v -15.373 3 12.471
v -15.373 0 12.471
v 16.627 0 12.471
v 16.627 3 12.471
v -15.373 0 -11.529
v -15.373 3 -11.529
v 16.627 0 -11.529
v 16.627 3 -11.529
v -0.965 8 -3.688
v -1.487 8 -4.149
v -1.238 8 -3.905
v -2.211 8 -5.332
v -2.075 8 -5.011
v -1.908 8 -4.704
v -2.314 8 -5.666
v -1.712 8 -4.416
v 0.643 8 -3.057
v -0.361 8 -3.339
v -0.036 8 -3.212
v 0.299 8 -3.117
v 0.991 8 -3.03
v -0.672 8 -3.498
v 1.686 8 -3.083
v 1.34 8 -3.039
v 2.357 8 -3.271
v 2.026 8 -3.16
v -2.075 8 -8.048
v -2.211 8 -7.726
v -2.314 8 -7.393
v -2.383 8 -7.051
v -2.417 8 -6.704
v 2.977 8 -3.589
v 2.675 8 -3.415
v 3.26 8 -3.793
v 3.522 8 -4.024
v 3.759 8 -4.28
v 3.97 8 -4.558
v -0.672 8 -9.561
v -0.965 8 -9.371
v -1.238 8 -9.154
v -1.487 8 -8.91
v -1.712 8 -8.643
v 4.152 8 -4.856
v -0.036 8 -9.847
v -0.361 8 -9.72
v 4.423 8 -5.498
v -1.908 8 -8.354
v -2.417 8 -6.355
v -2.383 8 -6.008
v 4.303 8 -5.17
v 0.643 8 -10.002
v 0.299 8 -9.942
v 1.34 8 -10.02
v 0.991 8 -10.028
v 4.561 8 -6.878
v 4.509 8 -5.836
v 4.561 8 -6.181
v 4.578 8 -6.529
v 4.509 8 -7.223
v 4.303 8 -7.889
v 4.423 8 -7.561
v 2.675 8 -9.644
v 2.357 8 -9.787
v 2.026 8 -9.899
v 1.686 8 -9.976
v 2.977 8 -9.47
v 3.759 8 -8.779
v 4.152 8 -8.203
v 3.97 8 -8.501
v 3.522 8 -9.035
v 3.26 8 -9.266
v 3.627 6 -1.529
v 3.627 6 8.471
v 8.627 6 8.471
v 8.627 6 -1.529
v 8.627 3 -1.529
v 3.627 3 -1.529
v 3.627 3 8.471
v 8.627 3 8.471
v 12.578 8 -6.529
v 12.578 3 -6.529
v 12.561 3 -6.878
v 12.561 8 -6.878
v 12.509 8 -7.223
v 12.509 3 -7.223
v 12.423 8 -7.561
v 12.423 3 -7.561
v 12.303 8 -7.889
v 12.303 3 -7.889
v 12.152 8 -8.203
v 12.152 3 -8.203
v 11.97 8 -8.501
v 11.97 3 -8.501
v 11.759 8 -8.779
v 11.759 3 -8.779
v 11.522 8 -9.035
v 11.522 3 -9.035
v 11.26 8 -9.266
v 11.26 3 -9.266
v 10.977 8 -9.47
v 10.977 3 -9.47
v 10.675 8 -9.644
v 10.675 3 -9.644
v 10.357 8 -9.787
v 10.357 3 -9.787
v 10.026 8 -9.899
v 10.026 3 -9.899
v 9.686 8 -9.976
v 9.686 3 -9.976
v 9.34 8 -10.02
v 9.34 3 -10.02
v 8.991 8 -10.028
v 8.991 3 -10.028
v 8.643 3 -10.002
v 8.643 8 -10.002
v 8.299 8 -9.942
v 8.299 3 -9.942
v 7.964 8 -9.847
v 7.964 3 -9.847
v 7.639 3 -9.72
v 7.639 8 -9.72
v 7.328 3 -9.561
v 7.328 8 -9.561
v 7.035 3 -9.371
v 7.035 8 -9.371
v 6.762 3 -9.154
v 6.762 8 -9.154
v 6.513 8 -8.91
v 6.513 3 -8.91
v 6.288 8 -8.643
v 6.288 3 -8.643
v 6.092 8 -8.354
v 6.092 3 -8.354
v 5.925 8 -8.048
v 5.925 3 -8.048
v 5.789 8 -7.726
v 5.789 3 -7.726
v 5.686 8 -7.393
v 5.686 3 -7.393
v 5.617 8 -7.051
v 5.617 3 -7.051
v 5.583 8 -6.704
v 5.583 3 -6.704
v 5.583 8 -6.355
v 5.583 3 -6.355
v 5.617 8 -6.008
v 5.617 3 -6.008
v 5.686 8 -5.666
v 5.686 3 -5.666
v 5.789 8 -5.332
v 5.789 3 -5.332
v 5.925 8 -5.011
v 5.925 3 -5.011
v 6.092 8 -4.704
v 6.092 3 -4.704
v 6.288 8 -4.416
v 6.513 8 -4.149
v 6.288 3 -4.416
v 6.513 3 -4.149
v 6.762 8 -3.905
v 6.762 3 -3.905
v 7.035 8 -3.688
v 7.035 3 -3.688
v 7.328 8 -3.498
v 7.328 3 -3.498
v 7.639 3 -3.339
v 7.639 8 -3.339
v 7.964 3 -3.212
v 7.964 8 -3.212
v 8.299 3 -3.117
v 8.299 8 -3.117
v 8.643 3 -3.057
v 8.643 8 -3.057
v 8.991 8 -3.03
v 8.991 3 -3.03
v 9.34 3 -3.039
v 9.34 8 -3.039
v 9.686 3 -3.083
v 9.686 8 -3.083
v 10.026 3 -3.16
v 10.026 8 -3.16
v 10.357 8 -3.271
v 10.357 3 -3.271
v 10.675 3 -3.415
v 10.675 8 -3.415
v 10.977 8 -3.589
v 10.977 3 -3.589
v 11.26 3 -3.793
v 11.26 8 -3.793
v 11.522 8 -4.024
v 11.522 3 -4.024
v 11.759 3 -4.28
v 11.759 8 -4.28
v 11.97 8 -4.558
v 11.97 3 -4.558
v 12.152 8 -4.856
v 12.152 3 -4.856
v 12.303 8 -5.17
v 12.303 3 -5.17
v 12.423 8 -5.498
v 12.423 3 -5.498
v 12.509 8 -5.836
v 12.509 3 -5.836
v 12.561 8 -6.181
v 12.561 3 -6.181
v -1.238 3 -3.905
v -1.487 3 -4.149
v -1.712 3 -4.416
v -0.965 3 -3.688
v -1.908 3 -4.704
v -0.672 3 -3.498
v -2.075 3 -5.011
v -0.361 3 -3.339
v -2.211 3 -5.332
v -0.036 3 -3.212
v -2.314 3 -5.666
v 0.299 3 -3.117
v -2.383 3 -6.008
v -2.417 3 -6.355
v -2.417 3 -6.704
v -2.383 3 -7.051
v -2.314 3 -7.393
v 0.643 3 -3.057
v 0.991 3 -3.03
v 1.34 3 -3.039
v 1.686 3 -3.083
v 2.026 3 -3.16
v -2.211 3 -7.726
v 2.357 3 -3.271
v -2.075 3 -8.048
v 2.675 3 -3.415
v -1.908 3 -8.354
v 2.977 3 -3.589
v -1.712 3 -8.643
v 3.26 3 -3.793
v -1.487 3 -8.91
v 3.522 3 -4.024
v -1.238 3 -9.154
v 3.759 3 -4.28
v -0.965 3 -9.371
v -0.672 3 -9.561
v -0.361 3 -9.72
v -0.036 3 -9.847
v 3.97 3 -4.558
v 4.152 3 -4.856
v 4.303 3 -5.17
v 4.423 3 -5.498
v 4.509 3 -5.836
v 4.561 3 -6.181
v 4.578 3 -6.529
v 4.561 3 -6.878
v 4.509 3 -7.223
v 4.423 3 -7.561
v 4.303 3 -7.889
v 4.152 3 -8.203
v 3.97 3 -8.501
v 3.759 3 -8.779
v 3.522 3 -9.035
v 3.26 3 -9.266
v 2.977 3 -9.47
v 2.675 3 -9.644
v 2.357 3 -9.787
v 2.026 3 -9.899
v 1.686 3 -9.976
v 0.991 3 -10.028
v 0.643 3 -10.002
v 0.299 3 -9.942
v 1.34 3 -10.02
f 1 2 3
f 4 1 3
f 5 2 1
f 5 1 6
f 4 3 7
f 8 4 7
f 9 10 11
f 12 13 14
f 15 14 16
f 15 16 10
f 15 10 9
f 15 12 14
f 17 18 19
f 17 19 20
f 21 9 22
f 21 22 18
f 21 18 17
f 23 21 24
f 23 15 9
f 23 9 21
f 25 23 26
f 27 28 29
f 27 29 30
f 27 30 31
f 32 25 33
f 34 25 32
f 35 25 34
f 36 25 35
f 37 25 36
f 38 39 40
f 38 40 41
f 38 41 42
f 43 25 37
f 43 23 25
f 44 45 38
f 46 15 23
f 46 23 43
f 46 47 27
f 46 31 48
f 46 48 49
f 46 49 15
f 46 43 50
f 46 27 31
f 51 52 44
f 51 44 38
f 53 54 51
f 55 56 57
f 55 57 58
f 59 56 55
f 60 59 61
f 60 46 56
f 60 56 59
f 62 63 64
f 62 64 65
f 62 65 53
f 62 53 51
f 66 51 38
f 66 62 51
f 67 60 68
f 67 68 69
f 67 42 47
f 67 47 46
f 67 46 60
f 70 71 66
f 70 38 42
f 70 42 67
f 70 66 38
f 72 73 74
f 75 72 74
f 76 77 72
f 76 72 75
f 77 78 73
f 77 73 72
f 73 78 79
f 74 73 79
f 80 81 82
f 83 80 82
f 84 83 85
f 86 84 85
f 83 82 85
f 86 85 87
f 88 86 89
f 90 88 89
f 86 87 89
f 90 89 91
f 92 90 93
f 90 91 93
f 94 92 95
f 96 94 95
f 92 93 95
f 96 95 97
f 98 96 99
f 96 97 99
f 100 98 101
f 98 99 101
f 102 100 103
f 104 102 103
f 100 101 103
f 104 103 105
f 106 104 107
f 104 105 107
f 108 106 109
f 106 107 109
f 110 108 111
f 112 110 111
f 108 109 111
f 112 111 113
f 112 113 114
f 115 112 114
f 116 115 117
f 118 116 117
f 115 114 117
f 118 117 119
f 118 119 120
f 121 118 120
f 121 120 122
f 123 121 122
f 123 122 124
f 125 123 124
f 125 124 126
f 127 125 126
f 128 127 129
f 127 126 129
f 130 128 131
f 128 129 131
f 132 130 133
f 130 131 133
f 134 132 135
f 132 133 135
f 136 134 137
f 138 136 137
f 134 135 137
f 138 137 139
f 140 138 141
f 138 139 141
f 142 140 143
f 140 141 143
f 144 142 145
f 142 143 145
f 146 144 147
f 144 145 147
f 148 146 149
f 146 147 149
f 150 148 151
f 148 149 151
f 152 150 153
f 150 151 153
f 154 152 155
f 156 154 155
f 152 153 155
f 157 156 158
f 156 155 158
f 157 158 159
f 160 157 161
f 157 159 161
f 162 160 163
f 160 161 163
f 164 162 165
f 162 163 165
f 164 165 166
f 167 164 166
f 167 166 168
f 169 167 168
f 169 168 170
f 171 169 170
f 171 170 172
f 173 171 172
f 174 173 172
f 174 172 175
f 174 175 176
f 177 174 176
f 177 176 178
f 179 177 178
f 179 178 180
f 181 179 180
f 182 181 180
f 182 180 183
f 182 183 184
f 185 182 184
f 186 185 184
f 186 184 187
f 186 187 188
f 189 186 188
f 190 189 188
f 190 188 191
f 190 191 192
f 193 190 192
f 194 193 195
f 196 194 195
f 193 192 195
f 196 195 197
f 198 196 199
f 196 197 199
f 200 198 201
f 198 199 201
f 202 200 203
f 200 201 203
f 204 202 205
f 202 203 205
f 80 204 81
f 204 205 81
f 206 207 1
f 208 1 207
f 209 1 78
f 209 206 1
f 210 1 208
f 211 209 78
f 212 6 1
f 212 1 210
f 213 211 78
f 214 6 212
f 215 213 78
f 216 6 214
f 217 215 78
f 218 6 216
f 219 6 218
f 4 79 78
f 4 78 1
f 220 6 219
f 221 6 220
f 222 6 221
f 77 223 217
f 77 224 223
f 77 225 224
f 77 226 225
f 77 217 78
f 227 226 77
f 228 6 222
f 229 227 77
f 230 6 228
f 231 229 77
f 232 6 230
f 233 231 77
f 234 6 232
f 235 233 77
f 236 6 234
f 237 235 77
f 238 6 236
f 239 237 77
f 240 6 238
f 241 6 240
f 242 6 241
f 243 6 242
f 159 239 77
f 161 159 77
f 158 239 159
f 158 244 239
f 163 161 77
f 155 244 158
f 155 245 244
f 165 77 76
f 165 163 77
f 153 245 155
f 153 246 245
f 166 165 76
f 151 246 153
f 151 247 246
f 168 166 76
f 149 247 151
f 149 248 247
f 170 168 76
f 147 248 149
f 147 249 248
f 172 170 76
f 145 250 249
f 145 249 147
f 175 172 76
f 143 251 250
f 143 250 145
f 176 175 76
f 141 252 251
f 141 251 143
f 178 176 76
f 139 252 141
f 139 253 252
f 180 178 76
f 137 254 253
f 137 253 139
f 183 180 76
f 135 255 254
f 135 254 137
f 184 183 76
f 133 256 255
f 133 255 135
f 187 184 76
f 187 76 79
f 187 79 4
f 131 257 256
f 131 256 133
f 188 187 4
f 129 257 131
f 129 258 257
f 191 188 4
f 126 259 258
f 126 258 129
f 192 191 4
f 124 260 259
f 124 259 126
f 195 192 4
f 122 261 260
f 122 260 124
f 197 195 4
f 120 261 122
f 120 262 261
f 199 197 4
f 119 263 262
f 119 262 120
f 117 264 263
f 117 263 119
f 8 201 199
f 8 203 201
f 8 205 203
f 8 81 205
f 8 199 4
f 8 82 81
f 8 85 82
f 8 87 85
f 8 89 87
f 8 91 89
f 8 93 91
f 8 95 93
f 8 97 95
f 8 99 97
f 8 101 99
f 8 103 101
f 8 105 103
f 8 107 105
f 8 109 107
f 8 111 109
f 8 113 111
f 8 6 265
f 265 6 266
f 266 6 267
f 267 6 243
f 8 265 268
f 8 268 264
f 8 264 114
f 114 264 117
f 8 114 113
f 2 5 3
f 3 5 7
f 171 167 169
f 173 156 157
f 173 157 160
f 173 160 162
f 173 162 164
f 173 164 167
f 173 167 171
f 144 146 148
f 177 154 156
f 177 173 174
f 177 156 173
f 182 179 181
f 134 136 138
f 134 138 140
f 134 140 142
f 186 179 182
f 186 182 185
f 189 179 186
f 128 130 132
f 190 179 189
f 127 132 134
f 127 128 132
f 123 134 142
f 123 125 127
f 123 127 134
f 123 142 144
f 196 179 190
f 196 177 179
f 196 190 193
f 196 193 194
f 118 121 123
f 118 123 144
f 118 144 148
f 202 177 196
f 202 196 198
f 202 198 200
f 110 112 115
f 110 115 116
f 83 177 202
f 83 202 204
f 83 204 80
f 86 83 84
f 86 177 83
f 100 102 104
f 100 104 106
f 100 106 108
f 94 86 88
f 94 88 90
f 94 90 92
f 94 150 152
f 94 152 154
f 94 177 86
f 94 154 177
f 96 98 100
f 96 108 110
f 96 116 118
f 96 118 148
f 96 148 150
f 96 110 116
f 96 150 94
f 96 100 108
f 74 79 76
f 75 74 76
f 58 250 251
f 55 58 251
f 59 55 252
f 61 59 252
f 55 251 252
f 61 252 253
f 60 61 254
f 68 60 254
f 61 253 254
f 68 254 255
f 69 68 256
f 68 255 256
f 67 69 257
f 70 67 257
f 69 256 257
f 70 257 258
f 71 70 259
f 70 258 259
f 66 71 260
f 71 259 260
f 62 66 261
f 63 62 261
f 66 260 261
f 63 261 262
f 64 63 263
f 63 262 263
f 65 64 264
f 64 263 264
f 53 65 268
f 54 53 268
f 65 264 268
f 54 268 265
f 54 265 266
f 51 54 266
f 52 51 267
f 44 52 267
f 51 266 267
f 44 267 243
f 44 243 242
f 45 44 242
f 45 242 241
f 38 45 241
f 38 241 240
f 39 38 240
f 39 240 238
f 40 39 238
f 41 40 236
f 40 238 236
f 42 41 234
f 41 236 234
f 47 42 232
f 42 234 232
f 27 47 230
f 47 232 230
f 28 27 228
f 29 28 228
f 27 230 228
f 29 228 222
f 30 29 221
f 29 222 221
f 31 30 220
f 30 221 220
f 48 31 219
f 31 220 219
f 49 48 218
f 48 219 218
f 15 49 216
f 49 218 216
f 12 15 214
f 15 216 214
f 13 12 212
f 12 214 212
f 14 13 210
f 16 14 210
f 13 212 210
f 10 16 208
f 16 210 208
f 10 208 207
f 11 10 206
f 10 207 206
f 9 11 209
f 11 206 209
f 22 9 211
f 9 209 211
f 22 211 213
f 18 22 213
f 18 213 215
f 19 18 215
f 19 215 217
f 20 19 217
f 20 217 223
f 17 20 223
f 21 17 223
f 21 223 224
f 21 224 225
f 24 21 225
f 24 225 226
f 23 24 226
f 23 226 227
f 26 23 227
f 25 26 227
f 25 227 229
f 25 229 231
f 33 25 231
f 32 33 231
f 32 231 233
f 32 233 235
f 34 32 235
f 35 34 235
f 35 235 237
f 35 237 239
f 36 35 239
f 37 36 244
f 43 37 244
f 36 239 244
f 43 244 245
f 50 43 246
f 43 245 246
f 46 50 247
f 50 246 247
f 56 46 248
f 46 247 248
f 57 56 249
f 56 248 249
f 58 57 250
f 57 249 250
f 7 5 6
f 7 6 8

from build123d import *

# Parameters (mm, degrees)
SKETCH1_W           = 32
SKETCH1_H           = 24
BOSS_EXTRUDE1_DEPTH = 3
SKETCH2_R           = 3.5
BOSS_EXTRUDE2_DEPTH = 5
SKETCH3_W           = 5
SKETCH3_H           = 10
BOSS_EXTRUDE3_DEPTH = 3


with BuildPart() as part:
    # Sketch1 → Boss-Extrude1 (new body)
    with BuildSketch(Plane(origin=(0, 0, 0), x_dir=(1, 0, 0), z_dir=(0, 1, 0))):
        with Locations((0.62745098, -0.470588235)):
            Rectangle(SKETCH1_W, SKETCH1_H)
    extrude(amount=BOSS_EXTRUDE1_DEPTH)

    # Sketch2 → Boss-Extrude2 (add)
    with BuildSketch(Plane(origin=(0, 3, 0), x_dir=(1, 0, 0), z_dir=(0, 1, 0))):
        with Locations((1.078230838, 6.529411765)):
            Circle(SKETCH2_R)
        with Locations((9.078230838, 6.529411765)):
            Circle(SKETCH2_R)
    extrude(amount=BOSS_EXTRUDE2_DEPTH)

    # Sketch3 → Boss-Extrude3 (add)
    with BuildSketch(Plane(origin=(0, 3, 0), x_dir=(1, 0, 0), z_dir=(0, 1, 0))):
        with Locations((6.12745098, -3.470588235)):
            Rectangle(SKETCH3_W, SKETCH3_H)
    extrude(amount=BOSS_EXTRUDE3_DEPTH)


solid = part.part
